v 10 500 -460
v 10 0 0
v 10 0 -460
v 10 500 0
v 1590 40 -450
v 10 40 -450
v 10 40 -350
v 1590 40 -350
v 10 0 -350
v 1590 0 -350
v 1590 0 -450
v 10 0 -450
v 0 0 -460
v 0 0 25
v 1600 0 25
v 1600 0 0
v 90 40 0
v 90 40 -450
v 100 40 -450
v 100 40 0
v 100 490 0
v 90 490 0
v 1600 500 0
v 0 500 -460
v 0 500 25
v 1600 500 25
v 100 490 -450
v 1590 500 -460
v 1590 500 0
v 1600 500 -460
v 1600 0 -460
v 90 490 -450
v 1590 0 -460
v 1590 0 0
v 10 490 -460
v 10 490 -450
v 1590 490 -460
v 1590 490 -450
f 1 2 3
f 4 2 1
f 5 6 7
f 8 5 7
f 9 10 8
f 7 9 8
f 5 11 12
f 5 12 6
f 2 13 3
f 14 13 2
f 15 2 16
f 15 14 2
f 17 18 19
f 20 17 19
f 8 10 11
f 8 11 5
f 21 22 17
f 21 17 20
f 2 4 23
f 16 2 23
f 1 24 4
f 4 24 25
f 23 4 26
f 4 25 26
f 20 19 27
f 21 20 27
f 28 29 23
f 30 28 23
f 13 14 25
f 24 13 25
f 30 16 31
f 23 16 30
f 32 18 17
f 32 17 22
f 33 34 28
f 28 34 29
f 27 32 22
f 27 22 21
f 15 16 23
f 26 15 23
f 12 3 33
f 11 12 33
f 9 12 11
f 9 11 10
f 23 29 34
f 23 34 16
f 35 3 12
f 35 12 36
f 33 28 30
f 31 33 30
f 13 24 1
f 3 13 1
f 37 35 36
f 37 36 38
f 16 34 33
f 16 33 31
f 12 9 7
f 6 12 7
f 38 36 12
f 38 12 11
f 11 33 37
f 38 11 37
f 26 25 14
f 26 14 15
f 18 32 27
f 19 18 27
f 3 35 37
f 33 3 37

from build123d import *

# Parameters (mm, degrees)
F0_W      = 1600
F0_H      = 500
F1_DEPTH  = 25
F3_W      = 1580
F3_H      = 490
F4_DEPTH  = 10
F5_W      = 10
F5_H      = 500
F6_DEPTH  = 460
F7_W      = 10
F7_H      = 500
F8_DEPTH  = 460
F9_W      = 40
F9_H      = 100
F10_DEPTH = 1580
F11_W     = 10
F11_H     = 450
F12_DEPTH = 450


with BuildPart() as f1:
    # F0 (on Top) → F1 (new body)
    with BuildSketch(Plane.XY):
        with Locations((800, 250)):
            Rectangle(F0_W, F0_H)
    extrude(amount=F1_DEPTH)

    # F5 (on face) → F6 (join, through all)
    with BuildSketch(Plane.XY):
        with Locations((5, 250)):
            Rectangle(F5_W, F5_H)
    extrude(amount=-F6_DEPTH)


with BuildPart() as f4:
    # F3 (on offset) → F4 (new body)
    with BuildSketch(Plane.XY.offset(-460)):
        with Locations((800, 245)):
            Rectangle(F3_W, F3_H)
    extrude(amount=F4_DEPTH)


with BuildPart() as f8:
    # F7 (on face) → F8 (new body, through all)
    with BuildSketch(Plane.XY):
        with Locations((1595, 250)):
            Rectangle(F7_W, F7_H)
    extrude(amount=-F8_DEPTH)


with BuildPart() as f10:
    # F9 (on face) → F10 (new body, through all)
    with BuildSketch(Plane.YZ.offset(10)):
        with Locations((20, -400)):
            Rectangle(F9_W, F9_H)
    extrude(amount=F10_DEPTH)


with BuildPart() as f12:
    # F11 (on face) → F12 (new body, through all)
    with BuildSketch(Plane.XY.offset(-450)):
        with Locations((95, 265)):
            Rectangle(F11_W, F11_H)
    extrude(amount=F12_DEPTH)


solid = Compound([f1.part, f4.part, f8.part, f10.part, f12.part])
